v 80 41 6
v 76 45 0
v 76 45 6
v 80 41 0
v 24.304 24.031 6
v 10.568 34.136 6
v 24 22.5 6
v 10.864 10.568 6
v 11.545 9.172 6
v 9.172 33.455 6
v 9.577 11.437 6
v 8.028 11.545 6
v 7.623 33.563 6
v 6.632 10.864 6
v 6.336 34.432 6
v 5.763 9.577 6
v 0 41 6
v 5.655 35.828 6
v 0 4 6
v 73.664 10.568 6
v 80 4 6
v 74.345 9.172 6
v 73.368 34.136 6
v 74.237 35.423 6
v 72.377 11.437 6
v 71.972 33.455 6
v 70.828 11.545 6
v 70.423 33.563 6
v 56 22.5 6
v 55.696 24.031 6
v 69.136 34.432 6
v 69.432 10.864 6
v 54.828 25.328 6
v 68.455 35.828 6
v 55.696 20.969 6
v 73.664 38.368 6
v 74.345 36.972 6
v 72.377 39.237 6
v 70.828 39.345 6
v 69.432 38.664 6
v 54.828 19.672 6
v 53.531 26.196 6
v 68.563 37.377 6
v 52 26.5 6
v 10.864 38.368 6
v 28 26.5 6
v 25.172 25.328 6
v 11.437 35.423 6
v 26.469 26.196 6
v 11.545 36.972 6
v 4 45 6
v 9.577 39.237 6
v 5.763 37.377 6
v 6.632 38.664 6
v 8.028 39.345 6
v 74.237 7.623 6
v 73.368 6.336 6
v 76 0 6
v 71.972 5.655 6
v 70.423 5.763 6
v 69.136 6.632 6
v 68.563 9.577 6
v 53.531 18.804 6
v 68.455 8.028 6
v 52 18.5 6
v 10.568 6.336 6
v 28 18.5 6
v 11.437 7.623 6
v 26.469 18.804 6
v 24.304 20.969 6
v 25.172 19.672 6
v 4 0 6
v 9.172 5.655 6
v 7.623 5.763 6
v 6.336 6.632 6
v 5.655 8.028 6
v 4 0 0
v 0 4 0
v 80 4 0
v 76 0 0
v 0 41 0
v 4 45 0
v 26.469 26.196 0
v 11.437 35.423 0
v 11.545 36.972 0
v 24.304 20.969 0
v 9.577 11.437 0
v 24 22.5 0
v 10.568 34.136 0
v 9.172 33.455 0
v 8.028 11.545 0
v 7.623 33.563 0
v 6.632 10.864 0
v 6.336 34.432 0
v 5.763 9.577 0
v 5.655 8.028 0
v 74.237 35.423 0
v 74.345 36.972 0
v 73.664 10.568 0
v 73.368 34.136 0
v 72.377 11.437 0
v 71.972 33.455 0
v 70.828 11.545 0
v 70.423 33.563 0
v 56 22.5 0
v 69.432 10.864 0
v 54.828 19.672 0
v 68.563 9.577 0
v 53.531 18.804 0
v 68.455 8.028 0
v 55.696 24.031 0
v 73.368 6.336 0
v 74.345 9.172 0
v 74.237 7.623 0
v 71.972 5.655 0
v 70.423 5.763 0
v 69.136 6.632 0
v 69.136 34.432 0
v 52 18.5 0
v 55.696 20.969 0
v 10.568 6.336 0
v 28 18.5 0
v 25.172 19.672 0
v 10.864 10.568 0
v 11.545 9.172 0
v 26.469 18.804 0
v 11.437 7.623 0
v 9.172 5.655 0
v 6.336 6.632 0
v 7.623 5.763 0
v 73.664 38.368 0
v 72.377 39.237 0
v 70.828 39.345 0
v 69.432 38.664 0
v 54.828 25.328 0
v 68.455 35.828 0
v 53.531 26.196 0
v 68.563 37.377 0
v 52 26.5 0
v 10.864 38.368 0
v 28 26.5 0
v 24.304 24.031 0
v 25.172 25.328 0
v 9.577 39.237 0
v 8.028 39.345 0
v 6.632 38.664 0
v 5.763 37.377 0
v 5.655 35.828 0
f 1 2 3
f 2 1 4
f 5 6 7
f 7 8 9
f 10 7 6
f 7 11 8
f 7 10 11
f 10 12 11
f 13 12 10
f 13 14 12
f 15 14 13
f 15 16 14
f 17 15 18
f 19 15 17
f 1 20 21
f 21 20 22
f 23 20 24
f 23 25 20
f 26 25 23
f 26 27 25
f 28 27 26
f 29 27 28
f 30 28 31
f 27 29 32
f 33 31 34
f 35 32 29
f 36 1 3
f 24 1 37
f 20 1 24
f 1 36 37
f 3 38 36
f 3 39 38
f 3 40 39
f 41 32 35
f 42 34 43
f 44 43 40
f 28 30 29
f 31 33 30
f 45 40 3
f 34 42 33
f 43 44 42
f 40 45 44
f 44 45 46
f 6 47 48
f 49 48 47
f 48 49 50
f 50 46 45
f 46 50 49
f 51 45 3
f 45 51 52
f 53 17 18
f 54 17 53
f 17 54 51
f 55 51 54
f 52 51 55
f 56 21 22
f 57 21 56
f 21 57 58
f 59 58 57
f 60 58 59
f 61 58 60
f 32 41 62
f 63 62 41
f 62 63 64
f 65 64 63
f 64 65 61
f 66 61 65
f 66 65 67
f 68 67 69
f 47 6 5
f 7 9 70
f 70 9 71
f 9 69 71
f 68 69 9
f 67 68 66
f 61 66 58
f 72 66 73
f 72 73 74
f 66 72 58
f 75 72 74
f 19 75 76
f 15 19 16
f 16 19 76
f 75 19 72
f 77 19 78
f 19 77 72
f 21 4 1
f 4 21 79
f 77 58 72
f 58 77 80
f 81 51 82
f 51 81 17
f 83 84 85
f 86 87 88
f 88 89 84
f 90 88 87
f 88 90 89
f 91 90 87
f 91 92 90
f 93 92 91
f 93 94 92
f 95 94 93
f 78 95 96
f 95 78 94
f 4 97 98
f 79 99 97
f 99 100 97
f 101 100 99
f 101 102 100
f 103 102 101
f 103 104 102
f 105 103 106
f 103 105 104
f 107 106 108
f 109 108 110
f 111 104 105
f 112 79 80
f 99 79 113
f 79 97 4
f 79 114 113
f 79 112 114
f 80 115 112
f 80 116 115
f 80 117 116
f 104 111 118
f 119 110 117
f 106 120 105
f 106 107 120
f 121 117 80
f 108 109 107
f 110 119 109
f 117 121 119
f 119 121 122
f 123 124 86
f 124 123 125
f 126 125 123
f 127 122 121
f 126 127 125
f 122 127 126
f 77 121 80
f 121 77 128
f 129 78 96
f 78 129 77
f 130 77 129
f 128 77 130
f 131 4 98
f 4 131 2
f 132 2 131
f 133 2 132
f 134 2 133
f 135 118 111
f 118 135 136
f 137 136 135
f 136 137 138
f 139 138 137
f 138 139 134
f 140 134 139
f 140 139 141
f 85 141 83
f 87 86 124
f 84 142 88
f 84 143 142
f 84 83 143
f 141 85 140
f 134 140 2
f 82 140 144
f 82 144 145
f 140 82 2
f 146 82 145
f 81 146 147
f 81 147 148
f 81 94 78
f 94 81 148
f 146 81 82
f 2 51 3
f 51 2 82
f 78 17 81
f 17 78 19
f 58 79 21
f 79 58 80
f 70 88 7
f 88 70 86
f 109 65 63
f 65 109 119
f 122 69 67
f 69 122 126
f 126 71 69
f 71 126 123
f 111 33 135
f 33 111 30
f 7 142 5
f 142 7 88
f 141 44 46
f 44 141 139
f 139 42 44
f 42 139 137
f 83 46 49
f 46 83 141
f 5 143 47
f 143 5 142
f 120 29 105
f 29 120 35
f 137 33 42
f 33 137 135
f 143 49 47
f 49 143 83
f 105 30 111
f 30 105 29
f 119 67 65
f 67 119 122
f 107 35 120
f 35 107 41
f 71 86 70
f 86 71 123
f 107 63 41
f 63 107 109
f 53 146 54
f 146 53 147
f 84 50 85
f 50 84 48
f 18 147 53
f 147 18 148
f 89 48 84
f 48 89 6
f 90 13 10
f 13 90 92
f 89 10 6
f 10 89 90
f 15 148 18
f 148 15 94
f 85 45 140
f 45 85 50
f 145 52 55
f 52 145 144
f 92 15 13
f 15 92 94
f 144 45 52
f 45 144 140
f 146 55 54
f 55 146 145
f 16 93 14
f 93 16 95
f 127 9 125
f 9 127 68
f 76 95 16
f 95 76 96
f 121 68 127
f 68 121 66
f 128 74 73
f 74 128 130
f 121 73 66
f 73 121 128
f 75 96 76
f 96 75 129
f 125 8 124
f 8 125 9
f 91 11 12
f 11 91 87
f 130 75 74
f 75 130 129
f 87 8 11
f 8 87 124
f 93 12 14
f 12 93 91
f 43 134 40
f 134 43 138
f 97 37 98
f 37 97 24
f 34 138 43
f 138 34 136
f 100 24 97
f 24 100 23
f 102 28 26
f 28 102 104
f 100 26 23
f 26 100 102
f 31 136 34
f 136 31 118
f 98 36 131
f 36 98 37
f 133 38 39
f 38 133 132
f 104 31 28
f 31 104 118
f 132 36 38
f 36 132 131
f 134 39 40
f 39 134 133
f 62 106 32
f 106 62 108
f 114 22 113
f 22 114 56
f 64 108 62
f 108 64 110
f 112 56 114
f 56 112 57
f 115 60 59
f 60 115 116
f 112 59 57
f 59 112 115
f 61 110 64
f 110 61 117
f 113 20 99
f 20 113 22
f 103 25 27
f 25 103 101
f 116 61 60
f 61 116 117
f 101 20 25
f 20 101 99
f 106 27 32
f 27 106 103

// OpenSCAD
$fn = 32;

// ----------------------------------------------------------------------
// Bracket plate: slot plate 80 x 45
// ----------------------------------------------------------------------

// --- parameters (mm) ---
hole_r = 3;               // bolt hole radius
plate_t = 6;              // plate thickness, Z (extrusion height)
plate_l = 80;             // plate length
plate_w = 45;             // plate width
slot_l = 24;              // slot straight length
slot_r = 4;               // slot end radius

slot_len = slot_l + 2 * slot_r;
slot_w = 2 * slot_r;
hole_d2 = 2 * hole_r;

profile = [[4, 0], [76, 0], [80, 4], [80, 41], [76, 45], [4, 45], [0, 41], [0, 4]];  // primary outline, 8 points, counter clockwise
void_1 = [[52, 18.5], [53.531, 18.804], [54.828, 19.672], [55.696, 20.969], [56, 22.5], [55.696, 24.031], [54.828, 25.328], [53.531, 26.196], [52, 26.5], [28, 26.5], [26.469, 26.196], [25.172, 25.328], [24.304, 24.031], [24, 22.5], [24.304, 20.969], [25.172, 19.672], [26.469, 18.804], [28, 18.5]];  // grip slot, 18 points
void_2 = [[11.545, 36.972], [10.864, 38.368], [9.577, 39.237], [8.028, 39.345], [6.632, 38.664], [5.763, 37.377], [5.655, 35.828], [6.336, 34.432], [7.623, 33.563], [9.172, 33.455], [10.568, 34.136], [11.437, 35.423]];  // corner hole, 12 points
void_3 = [[11.545, 9.172], [10.864, 10.568], [9.577, 11.437], [8.028, 11.545], [6.632, 10.864], [5.763, 9.577], [5.655, 8.028], [6.336, 6.632], [7.623, 5.763], [9.172, 5.655], [10.568, 6.336], [11.437, 7.623]];  // corner hole, 12 points
void_4 = [[74.345, 36.972], [73.664, 38.368], [72.377, 39.237], [70.828, 39.345], [69.432, 38.664], [68.563, 37.377], [68.455, 35.828], [69.136, 34.432], [70.423, 33.563], [71.972, 33.455], [73.368, 34.136], [74.237, 35.423]];  // corner hole, 12 points
void_5 = [[74.345, 9.172], [73.664, 10.568], [72.377, 11.437], [70.828, 11.545], [69.432, 10.864], [68.563, 9.577], [68.455, 8.028], [69.136, 6.632], [70.423, 5.763], [71.972, 5.655], [73.368, 6.336], [74.237, 7.623]];  // corner hole, 12 points

// --- the one profile operation ---
difference() {
  linear_extrude(height = plate_t) polygon(points = profile);
  translate([0, 0, -1])
    linear_extrude(height = plate_t + 2) polygon(points = void_1);
  translate([0, 0, -1])
    linear_extrude(height = plate_t + 2) polygon(points = void_2);
  translate([0, 0, -1])
    linear_extrude(height = plate_t + 2) polygon(points = void_3);
  translate([0, 0, -1])
    linear_extrude(height = plate_t + 2) polygon(points = void_4);
  translate([0, 0, -1])
    linear_extrude(height = plate_t + 2) polygon(points = void_5);
}
